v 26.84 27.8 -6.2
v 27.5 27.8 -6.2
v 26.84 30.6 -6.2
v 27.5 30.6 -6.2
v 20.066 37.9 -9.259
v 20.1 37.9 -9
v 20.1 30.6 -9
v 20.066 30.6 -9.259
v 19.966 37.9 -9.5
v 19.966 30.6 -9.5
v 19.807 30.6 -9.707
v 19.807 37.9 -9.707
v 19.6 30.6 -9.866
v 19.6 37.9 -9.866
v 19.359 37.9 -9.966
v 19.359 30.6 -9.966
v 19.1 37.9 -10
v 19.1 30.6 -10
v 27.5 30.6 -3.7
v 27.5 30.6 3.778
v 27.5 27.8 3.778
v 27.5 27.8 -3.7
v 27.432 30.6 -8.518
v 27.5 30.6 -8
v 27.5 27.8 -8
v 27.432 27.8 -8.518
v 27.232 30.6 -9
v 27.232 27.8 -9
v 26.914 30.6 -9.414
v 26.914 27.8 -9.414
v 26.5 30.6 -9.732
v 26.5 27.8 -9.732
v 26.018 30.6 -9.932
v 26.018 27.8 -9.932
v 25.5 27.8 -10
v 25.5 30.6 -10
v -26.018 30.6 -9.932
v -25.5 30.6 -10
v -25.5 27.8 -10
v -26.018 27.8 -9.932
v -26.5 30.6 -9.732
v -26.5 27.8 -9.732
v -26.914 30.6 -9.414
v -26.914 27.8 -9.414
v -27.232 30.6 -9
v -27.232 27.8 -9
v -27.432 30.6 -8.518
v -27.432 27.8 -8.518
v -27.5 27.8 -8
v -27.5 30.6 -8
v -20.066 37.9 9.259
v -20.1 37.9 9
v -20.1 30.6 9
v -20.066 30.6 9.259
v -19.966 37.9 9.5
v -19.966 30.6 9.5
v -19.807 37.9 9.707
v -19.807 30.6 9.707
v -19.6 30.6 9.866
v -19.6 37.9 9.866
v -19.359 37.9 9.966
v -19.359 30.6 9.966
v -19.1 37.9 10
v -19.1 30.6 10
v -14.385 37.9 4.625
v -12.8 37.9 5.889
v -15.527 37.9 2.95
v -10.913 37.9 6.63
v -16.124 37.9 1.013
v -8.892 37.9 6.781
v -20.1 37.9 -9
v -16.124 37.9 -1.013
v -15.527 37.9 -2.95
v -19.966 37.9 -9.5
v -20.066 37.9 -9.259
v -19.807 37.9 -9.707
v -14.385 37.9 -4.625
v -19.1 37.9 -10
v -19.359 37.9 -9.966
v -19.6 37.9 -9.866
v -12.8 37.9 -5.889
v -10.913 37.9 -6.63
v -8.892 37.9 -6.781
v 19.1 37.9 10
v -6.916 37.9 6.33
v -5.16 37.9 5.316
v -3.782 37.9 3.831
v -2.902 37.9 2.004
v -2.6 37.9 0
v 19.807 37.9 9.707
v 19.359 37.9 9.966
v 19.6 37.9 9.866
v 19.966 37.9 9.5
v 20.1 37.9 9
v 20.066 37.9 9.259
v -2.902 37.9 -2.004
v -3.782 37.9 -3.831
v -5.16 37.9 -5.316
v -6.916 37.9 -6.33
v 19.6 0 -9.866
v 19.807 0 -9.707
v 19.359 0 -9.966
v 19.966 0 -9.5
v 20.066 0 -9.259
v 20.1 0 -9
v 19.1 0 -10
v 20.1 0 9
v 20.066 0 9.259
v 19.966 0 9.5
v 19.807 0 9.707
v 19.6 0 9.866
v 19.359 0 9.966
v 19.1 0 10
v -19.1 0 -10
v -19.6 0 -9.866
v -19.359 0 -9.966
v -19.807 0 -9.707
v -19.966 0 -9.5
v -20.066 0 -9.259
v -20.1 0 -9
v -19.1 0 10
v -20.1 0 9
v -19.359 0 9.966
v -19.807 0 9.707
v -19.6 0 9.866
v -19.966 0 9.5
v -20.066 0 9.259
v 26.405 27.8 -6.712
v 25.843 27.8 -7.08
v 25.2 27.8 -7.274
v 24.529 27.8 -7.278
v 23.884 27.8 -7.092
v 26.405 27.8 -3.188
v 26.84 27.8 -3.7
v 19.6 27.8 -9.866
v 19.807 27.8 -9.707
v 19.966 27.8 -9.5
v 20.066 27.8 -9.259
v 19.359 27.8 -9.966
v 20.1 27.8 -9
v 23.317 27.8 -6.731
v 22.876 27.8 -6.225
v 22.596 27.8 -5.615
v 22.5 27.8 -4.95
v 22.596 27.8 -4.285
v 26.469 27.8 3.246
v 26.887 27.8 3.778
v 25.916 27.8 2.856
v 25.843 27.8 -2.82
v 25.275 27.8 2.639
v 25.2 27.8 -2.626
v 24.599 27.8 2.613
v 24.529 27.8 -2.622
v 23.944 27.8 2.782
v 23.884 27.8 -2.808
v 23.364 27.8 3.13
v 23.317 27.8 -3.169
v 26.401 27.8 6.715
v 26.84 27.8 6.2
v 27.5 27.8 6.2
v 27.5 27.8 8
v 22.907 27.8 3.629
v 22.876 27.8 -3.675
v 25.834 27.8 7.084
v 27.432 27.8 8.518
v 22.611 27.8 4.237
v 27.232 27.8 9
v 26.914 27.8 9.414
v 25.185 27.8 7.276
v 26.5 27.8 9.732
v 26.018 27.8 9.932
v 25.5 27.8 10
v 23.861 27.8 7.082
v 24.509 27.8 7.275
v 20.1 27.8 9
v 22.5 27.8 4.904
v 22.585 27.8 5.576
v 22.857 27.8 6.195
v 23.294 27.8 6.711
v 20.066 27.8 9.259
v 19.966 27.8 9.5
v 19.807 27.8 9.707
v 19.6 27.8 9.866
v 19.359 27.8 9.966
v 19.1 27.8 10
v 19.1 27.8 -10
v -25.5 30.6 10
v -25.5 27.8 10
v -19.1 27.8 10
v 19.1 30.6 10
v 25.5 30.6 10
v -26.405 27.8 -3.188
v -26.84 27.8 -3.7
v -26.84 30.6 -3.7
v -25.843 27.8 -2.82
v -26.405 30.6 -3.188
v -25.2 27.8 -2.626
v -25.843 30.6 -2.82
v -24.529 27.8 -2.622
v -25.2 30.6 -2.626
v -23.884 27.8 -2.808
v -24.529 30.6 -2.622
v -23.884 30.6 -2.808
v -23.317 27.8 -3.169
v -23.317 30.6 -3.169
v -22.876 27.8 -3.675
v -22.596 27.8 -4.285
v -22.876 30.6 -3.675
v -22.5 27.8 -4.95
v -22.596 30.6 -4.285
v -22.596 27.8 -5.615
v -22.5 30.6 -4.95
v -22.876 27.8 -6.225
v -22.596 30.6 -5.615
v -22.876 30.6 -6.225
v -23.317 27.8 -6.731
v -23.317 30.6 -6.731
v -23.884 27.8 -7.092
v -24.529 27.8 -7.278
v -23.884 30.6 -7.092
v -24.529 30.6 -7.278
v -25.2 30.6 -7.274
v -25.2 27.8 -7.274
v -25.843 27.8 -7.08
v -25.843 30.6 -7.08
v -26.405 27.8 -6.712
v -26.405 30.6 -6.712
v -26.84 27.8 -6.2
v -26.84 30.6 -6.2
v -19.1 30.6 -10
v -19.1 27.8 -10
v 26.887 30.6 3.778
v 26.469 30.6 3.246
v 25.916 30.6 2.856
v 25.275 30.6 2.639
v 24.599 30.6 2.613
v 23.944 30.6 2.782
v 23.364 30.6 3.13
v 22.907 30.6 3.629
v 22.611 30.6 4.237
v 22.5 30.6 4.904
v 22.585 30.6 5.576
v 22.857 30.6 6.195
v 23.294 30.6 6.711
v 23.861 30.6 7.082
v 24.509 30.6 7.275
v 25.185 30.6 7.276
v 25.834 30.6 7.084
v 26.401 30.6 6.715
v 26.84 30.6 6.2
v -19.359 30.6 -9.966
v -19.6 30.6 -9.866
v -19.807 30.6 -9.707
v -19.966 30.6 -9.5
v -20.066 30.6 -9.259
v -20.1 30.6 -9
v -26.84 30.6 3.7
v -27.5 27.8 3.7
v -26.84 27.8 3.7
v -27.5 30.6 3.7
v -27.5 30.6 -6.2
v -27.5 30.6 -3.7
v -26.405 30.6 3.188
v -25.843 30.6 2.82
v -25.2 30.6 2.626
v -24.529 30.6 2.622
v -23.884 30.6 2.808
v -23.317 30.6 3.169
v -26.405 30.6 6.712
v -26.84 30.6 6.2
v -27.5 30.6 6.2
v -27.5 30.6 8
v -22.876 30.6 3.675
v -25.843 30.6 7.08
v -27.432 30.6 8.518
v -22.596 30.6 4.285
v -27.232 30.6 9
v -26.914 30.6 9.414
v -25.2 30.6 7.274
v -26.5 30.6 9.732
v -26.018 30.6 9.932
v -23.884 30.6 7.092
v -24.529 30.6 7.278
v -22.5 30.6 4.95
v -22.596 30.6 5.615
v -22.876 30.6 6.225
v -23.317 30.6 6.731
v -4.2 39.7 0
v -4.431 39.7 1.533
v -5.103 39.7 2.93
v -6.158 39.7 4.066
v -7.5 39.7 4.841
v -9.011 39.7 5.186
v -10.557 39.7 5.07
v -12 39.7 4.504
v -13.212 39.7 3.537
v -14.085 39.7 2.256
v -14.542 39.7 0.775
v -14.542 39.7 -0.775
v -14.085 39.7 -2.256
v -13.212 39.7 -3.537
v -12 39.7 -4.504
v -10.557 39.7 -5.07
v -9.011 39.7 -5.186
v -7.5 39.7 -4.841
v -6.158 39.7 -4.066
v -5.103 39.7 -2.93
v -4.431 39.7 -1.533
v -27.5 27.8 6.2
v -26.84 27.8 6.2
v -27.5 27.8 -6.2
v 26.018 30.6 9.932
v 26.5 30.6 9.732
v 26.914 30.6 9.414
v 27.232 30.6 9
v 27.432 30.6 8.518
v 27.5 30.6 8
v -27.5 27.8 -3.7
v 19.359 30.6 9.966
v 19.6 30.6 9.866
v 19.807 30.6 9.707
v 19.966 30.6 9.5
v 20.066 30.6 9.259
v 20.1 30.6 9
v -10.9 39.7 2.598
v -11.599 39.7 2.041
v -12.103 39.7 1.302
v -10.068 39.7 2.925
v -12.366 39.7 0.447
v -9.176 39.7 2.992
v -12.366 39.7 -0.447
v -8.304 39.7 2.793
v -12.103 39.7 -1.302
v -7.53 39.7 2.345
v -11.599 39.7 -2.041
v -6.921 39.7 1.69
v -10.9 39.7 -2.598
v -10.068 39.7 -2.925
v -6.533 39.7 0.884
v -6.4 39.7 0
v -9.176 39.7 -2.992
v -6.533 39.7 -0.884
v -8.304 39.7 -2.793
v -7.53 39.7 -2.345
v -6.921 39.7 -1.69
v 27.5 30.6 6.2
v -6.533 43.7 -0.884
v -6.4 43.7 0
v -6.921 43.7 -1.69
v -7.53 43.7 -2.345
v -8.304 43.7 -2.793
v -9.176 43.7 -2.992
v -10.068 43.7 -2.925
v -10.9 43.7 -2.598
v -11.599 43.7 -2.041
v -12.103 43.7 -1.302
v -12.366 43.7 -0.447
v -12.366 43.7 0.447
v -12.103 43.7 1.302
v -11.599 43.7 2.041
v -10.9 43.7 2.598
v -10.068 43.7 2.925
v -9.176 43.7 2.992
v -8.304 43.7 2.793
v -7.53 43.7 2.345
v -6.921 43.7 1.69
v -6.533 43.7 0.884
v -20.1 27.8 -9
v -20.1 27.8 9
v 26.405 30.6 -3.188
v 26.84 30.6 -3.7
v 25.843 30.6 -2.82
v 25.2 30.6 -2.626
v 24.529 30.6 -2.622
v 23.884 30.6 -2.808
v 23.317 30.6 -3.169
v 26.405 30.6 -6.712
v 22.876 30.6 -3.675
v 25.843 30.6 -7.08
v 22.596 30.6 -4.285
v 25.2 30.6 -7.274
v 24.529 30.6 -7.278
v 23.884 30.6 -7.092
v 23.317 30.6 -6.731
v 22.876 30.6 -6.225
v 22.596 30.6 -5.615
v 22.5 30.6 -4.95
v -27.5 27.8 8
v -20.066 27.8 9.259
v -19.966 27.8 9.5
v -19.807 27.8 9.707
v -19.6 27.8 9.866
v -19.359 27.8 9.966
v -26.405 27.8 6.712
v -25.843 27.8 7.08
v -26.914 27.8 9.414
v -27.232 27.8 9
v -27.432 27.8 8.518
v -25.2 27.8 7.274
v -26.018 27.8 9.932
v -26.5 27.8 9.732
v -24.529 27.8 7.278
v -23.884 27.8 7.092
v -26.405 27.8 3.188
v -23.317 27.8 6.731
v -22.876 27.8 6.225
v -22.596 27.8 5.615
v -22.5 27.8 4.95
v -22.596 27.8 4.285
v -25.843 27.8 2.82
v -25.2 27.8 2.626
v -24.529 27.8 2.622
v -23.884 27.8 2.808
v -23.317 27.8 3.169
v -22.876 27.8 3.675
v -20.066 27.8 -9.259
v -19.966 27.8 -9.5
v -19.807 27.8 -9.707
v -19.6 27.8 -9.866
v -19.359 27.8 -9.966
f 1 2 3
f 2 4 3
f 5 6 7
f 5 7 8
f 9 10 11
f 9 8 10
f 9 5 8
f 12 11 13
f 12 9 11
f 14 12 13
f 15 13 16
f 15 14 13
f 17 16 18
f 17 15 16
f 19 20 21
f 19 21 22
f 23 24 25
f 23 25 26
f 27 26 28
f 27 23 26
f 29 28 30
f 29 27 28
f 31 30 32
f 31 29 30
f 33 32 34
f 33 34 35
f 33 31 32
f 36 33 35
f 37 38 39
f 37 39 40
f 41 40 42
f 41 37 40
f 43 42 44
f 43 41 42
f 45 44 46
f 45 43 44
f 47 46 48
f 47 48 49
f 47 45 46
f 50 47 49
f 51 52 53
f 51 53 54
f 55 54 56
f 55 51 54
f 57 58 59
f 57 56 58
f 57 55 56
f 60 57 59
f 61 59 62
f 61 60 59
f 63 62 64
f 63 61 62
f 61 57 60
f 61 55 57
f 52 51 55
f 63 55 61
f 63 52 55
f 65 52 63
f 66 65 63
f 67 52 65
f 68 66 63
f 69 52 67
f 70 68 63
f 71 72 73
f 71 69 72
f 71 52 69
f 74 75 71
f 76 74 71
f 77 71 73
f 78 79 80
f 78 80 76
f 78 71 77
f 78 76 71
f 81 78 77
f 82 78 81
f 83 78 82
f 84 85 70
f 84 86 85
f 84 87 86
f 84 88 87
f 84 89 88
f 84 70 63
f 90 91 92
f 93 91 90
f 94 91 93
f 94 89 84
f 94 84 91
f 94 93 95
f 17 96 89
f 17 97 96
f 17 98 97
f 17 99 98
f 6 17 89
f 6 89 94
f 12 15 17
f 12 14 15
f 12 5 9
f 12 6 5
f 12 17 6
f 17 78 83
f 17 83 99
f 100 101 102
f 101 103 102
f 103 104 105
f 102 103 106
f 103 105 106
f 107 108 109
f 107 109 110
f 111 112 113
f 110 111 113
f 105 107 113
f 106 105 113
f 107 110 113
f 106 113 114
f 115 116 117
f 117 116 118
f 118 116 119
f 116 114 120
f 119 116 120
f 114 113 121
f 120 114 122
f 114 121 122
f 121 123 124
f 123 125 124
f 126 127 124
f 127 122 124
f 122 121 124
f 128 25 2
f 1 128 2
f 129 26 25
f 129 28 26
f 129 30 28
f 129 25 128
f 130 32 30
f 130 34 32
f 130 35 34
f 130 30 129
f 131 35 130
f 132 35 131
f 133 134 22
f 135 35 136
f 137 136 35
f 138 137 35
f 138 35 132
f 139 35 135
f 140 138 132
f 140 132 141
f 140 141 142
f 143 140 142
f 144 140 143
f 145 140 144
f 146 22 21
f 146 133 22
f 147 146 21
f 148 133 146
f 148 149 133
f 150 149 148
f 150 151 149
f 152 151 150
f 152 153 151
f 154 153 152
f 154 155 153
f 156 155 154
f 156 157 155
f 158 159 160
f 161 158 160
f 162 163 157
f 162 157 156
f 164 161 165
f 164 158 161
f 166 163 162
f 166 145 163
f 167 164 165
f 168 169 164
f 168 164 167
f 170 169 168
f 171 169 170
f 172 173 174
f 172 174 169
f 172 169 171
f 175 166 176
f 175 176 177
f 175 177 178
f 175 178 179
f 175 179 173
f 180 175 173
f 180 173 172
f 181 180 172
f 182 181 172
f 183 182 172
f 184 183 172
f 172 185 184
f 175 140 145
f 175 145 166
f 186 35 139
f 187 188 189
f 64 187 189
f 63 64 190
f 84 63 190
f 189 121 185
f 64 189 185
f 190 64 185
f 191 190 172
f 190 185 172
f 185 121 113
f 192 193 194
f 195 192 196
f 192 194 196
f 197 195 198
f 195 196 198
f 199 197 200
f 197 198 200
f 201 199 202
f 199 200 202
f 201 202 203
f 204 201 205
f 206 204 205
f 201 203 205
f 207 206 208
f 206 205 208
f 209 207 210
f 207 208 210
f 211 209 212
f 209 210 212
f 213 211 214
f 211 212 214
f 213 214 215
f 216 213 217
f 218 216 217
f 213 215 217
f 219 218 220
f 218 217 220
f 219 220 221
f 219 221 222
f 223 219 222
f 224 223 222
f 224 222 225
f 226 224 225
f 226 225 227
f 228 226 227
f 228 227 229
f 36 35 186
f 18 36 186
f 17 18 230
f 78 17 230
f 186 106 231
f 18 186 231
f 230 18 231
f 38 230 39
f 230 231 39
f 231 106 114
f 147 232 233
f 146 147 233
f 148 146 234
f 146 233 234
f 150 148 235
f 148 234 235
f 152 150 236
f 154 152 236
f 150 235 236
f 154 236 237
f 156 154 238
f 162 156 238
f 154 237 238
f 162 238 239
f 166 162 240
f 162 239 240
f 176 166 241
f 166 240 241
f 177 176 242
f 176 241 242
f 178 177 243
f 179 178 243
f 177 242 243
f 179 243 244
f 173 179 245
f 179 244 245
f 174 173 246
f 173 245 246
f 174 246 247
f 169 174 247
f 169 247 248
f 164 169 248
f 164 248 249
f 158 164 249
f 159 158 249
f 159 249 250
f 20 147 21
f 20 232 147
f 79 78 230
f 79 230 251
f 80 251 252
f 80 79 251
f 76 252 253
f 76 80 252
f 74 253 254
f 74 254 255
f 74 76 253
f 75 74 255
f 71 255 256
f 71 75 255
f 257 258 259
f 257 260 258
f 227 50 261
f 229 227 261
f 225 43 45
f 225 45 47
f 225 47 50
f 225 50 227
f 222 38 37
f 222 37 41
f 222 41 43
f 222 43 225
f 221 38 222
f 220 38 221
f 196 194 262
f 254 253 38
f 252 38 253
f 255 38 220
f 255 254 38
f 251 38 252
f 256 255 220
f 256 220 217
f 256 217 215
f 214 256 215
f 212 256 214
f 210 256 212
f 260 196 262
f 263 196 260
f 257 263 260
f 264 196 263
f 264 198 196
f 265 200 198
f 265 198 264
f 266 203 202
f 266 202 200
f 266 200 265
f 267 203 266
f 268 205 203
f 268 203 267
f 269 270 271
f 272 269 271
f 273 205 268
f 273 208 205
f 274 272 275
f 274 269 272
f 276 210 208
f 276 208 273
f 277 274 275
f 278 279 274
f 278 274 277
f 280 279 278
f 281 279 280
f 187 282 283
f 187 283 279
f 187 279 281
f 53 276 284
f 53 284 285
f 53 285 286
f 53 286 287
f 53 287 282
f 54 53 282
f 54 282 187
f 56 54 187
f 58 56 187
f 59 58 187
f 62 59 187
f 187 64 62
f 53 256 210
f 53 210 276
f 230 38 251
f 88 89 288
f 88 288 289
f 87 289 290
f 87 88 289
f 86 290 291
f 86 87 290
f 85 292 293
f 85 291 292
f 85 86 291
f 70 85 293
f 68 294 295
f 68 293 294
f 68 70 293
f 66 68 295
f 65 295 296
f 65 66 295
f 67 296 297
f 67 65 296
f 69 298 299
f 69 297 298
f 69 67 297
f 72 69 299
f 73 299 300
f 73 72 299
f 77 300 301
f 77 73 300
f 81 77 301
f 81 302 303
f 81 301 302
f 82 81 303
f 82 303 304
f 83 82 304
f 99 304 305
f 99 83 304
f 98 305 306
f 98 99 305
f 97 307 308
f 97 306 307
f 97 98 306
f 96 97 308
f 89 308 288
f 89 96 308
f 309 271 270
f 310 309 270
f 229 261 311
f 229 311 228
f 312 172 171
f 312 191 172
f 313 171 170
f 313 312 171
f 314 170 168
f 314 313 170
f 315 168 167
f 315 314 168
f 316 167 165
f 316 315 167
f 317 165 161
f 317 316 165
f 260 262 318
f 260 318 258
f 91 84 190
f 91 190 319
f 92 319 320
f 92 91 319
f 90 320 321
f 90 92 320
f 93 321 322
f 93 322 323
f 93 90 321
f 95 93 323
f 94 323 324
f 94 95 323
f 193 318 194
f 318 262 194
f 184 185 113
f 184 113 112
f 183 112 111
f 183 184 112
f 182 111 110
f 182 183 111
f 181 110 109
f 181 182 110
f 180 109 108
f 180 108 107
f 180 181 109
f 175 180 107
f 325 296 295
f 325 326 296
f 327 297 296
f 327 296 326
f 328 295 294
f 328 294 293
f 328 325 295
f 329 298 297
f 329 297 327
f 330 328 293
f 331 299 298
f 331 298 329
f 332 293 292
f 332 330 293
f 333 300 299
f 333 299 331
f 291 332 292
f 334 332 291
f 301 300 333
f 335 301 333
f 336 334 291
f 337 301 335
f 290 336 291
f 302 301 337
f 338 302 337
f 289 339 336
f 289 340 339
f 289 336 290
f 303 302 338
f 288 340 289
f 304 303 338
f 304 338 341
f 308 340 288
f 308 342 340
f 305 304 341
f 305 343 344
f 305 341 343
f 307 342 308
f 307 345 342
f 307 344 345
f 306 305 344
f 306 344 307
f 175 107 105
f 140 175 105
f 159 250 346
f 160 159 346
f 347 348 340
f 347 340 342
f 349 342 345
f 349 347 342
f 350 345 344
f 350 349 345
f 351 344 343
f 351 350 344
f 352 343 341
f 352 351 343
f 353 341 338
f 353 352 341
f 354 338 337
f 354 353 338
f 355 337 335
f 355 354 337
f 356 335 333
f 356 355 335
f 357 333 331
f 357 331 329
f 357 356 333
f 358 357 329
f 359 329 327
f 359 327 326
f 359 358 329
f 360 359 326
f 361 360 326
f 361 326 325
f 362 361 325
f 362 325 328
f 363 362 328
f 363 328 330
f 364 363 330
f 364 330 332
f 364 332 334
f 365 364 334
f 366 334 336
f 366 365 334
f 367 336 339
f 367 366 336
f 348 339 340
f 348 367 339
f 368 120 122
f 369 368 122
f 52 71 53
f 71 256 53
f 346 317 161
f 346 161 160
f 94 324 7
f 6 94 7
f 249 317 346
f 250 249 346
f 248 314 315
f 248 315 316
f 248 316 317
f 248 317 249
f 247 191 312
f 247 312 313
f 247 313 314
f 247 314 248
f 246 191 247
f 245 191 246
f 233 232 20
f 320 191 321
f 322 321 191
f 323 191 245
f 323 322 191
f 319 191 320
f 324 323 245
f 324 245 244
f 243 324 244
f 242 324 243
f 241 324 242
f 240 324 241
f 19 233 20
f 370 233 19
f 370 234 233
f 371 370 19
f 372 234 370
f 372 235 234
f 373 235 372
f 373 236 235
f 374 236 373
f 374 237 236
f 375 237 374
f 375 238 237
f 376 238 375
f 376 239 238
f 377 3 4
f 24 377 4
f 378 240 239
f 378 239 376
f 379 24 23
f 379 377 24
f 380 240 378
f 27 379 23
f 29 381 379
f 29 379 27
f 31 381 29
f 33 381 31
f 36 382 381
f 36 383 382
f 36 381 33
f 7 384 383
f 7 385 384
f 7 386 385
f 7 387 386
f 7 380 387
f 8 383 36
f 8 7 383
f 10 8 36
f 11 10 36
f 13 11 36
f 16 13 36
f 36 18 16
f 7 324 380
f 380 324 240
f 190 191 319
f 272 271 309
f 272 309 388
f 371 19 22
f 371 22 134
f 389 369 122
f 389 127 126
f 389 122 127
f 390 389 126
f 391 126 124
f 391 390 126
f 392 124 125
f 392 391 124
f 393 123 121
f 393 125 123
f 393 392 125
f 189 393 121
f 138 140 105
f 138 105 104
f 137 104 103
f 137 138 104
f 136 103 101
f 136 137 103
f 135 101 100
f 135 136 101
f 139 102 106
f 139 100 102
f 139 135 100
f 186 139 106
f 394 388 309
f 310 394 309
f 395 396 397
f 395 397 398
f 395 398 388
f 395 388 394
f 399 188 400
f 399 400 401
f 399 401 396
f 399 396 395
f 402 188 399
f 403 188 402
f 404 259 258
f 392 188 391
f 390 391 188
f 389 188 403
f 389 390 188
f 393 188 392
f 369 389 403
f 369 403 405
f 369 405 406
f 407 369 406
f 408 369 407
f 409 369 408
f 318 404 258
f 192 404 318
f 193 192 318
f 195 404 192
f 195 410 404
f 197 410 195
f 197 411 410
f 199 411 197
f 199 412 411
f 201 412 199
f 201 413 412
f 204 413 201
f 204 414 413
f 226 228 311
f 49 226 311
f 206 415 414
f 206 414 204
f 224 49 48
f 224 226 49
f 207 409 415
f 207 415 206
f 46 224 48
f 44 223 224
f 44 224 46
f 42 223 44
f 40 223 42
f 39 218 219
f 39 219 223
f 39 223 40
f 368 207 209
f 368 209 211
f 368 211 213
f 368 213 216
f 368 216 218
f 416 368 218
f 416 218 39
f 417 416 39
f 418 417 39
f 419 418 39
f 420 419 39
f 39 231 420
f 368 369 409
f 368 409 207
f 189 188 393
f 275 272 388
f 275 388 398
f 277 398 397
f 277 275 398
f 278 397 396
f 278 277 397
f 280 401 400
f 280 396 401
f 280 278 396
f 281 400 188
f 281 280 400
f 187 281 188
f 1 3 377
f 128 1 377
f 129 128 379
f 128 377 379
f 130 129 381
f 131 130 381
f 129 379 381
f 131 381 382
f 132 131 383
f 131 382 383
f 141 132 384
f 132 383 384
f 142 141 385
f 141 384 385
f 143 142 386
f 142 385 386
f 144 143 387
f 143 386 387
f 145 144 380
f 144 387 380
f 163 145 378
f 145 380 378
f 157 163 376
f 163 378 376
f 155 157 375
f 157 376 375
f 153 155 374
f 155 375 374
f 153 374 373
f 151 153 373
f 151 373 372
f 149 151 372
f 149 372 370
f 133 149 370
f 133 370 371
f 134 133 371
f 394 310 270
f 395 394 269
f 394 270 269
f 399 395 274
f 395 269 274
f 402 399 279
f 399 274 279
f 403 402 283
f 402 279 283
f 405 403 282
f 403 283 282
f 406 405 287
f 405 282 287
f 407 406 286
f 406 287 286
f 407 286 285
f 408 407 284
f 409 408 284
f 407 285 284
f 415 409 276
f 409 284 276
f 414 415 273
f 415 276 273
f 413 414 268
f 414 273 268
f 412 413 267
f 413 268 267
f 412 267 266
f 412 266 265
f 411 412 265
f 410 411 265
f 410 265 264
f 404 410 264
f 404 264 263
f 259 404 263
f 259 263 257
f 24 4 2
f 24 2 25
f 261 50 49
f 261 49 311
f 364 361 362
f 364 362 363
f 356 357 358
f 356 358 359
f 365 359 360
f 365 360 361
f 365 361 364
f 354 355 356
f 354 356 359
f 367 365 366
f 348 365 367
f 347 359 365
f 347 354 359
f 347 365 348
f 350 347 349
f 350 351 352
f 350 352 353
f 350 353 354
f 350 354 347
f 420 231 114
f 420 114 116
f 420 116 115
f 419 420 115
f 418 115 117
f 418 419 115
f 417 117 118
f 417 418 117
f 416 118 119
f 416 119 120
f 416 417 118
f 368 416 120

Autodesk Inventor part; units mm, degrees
ref_plane "YZ Plane" through (0, 0, 0) normal (1, 0, 0) x (0, 1, 0)
ref_plane "XZ Plane" through (0, 0, 0) normal (0, 1, 0) x (-1, 0, 0)
ref_plane "XY Plane" through (0, 0, 0) normal (0, 0, 1) x (1, 0, 0)
sketch "Sketch1" plane through (0, 0, 0) normal (0, 1, 0) x (-1, 0, 0)
  line L0 (-20.1, -10) -> (20.1, -10)
  line L1 (20.1, -10) -> (20.1, 10)
  line L2 (20.1, 10) -> (-20.1, 10)
  line L3 (-20.1, 10) -> (-20.1, -10)
  line L4 (-20.1, -10) -> (20.1, 10) construction
  line L5 (20.1, -10) -> (-20.1, 10) construction
  point P0 (0, 0)
extrude "Extrusion1" add sketch "Sketch1" along normal blind 43.7
sketch "Sketch2" plane through (20.1, 0, 10) normal (1, 0, 0) x (0, 0, -1)
  line L0 (20, 0) -> (20, 43.7) projected
  line L1 (0, 0) -> (0, 43.7) projected
  line L2 (20, 27.8) -> (0, 27.8)
  line L3 (0, 27.8) -> (0, 30.6)
  line L4 (0, 30.6) -> (20, 30.6)
  line L5 (20, 30.6) -> (20, 27.8)
  point P0 (10, 0)
sketch "Sketch3" plane through (-20.1, 0, -10) normal (-1, 0, 0) x (0, 0, 1)
  line L0 (20, 0) -> (20, 43.7) projected
  line L1 (0, 0) -> (0, 43.7) projected
  line L2 (20, 27.8) -> (0, 27.8)
  line L3 (0, 27.8) -> (0, 30.6)
  line L4 (0, 30.6) -> (20, 30.6)
  line L5 (20, 30.6) -> (20, 27.8)
  point P0 (10, 0)
extrude "Extrusion2" add sketch "Sketch3" along normal blind 7.4
extrude "Extrusion3" add sketch "Sketch2" along normal blind 7.4
sketch "Sketch4" plane through (0, 43.7, 0) normal (0, 1, 0) x (1, 0, 0)
  line L0 (20.1, 10) -> (-20.1, 10) projected
  line L1 (-20.1, 10) -> (-20.1, -10) projected
  line L2 (-20.1, -10) -> (20.1, -10) projected
  line L3 (20.1, -10) -> (20.1, 10) projected
  circle A0 centre (-9.4, 0) radius 6.8
  circle A1 centre (-9.4, 0) radius 5.1
  circle A2 centre (-9.4, 0) radius 3
extrude "Extrusion4" cut sketch "Sketch4" against normal blind 5.8 contours L3 L2 L1 L0
sketch "Sketch5" plane through (-9.4, 43.7, 0) normal (0, 1, 0) x (1, 0, 0)
  circle A0 centre (0, 0) radius 6.8 projected
  circle A1 centre (0, 0) radius 2.5
  dimension "d20" = 5
extrude "Extrusion5" cut sketch "Sketch5" against normal blind 4
fillet "Fillet1" radius 2 1 edges at (-27.5, 29.2, 10)
fillet "Fillet2" radius 2 1 edges at (27.5, 29.2, 10)
fillet "Fillet3" radius 2 1 edges at (27.5, 29.2, -10)
fillet "Fillet4" radius 2 1 edges at (-27.5, 29.2, -10)
fillet "Fillet5" radius 1 1 edges at (-20.1, 34.25, -10)
fillet "Fillet6" radius 1 1 edges at (-20.1, 13.9, -10)
fillet "Fillet7" radius 1 1 edges at (-20.1, 34.25, 10)
fillet "Fillet8" radius 1 1 edges at (-20.1, 13.9, 10)
fillet "Fillet9" radius 1 1 edges at (20.1, 34.25, 10)
fillet "Fillet10" radius 1 1 edges at (20.1, 13.9, 10)
fillet "Fillet11" radius 1 1 edges at (20.1, 34.25, -10)
fillet "Fillet12" radius 1 1 edges at (20.1, 13.9, -10)
sketch "Sketch6" plane through (-9.4, 43.7, 0) normal (0, 1, 0) x (1, 0, 0)
  circle A0 centre (0, 0) radius 3
  point P0 (9.4, 0)
extrude "Extrusion6" add sketch "Sketch6" against normal blind 4
chamfer "Chamfer3" distance 1.8 distance2 1.6 1 edges at (-16.2, 39.7, 0) measured on face at (-2.6881, 38.5, 1.0908)
sketch "Sketch7" plane through (27.5, 30.6, 8) normal (0, 1, 0) x (1, 0, 0)
  circle A0 centre (-2.65, 12.95) radius 2.35
  circle A1 centre (-2.65, 3.05) radius 2.35
  line L0 (-0.0003, 1.8) -> (-0.66, 1.8)
  line L1 (-0.0003, 4.222) -> (-0.6131, 4.222)
  line L2 (-0.0003, 12.95) -> (-0.0003, 14.2)
  line L3 (-0.0003, 14.2) -> (-0.66, 14.2)
  line L4 (-0.0003, 12.95) -> (-0.0003, 11.7)
  line L5 (-0.0003, 11.7) -> (-0.66, 11.7)
  line L6 (-0.0003, 4.222) -> (-0.0003, 1.8)
  line L7 (0, 16) -> (0, 0) projected
  line L8 (-0.0003, 14.2) -> (2.6929, 14.2)
  line L9 (-0.0003, 11.7) -> (2.6929, 11.7)
  line L10 (2.6929, 11.7) -> (2.6929, 14.2)
  line L11 (-0.0003, 4.222) -> (2.459, 4.222)
  line L12 (-0.0003, 1.8) -> (2.459, 1.8)
  line L13 (2.459, 1.8) -> (2.459, 4.222)
  point P0 (-27.5, 8)
sketch "Sketch8" plane through (-27.5, 30.6, 8) normal (0, 1, 0) x (1, 0, 0)
  circle A0 centre (2.65, 12.95) radius 2.35
  circle A1 centre (2.65, 3.05) radius 2.35
  line L0 (0, 3.05) -> (0, 4.3)
  line L1 (0, 4.3) -> (0, 1.8)
  line L2 (0, 4.3) -> (0.66, 4.3)
  line L3 (0, 1.8) -> (0.66, 1.8)
  line L4 (0, 12.95) -> (0, 11.7)
  line L5 (0, 11.7) -> (0.66, 11.7)
  line L6 (0, 12.95) -> (0, 14.2)
  line L7 (0, 14.2) -> (0.66, 14.2)
  point P0 (27.5, 8)
extrude "Extrusion7" cut sketch "Sketch7" against normal blind 3
extrude "Extrusion8" cut sketch "Sketch8" against normal blind 3
properties part number "standart_servo"
